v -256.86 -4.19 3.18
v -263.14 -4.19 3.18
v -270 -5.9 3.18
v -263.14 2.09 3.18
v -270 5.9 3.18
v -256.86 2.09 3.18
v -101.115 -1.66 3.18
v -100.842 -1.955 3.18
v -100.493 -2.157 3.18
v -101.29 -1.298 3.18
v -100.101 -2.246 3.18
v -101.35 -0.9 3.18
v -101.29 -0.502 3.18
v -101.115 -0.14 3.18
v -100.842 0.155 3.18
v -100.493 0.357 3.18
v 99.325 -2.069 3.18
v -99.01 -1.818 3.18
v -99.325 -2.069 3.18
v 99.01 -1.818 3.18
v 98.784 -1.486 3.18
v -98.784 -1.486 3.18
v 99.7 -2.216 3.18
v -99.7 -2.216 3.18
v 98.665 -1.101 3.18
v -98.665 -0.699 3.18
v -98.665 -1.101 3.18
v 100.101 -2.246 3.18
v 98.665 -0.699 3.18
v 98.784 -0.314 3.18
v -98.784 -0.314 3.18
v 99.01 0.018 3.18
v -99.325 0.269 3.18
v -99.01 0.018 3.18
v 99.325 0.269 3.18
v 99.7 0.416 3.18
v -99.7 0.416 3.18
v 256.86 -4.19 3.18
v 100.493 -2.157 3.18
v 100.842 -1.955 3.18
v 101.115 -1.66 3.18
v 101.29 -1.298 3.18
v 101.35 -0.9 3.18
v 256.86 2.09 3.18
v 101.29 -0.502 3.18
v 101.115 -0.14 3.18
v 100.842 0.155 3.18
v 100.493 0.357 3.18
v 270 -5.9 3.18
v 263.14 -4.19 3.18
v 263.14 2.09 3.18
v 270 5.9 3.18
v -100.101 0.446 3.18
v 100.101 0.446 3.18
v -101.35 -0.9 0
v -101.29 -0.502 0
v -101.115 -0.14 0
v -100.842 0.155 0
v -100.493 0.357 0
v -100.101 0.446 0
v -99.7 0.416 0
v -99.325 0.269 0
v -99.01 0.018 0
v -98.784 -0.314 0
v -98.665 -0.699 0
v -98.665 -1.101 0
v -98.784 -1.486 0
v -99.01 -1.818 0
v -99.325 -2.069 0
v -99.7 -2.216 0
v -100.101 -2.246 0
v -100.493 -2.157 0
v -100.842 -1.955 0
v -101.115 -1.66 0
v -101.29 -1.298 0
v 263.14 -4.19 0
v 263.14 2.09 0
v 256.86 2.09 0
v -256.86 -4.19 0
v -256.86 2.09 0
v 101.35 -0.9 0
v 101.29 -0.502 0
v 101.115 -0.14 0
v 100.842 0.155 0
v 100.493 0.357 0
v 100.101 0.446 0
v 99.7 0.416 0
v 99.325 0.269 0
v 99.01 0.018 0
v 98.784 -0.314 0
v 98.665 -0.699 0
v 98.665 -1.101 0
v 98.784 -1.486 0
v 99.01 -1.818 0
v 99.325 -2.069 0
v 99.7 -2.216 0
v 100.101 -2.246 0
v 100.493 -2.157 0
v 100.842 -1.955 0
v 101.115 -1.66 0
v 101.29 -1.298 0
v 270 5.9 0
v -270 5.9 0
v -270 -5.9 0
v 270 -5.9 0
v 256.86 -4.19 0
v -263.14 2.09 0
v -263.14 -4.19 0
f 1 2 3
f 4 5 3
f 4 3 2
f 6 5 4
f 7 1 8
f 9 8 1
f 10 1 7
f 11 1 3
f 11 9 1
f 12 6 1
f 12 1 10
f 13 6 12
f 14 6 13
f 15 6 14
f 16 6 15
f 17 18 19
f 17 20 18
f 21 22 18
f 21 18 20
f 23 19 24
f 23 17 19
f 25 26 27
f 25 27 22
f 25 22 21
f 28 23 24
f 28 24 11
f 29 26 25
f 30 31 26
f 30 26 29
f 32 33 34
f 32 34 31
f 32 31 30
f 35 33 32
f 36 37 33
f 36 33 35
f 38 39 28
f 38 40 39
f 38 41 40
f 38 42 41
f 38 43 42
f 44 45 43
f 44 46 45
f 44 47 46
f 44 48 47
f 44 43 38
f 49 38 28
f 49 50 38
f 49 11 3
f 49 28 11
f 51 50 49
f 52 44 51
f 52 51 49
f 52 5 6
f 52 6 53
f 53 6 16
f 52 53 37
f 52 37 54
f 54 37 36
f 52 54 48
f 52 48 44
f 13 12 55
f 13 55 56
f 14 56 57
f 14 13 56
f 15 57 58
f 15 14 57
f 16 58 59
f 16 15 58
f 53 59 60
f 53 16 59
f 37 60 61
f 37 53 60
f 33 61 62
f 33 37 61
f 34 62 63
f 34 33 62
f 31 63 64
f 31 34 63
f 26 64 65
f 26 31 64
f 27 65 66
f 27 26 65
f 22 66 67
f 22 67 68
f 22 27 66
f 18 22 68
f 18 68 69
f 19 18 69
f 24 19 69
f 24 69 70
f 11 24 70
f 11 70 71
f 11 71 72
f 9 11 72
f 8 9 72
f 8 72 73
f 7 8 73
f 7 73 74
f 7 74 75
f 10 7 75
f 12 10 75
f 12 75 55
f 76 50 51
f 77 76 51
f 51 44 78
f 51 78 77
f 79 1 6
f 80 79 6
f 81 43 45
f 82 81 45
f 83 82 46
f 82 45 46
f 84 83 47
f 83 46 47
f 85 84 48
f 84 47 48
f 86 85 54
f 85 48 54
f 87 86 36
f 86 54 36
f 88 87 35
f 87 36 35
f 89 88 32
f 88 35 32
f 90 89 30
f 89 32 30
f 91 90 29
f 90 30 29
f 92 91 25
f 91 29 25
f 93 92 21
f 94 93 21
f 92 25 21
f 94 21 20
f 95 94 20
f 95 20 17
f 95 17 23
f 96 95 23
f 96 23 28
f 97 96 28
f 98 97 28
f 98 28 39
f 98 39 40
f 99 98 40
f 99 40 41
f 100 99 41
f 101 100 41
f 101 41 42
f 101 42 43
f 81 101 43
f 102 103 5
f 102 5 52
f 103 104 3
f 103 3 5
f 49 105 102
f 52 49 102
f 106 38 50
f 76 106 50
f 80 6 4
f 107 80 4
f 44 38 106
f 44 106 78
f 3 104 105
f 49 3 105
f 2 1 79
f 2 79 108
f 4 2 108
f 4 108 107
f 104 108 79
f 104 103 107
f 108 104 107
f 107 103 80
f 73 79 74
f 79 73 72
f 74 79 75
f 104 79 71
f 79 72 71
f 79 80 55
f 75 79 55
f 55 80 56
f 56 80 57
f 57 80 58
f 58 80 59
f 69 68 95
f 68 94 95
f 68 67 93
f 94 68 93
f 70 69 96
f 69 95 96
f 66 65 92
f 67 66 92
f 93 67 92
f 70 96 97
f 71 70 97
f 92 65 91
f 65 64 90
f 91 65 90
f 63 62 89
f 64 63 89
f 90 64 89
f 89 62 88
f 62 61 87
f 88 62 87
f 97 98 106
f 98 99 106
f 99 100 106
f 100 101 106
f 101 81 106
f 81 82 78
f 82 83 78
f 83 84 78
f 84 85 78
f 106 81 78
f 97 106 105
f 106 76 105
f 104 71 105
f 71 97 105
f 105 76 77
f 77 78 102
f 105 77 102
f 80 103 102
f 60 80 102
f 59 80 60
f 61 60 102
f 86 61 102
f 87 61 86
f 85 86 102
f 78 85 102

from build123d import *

# Parameters (mm, degrees)
SKETCH1_W           = 540
SKETCH1_H           = 11.8
BOSS_EXTRUDE1_DEPTH = 3.18
CUT_EXTRUDE1_REACH  = 272.083
SKETCH2_W           = 6.28
SKETCH2_H           = 6.28
CUT_EXTRUDE2_REACH  = 272.083
SKETCH3_R           = 1.35


with BuildPart() as part:
    # Sketch1 → Boss-Extrude1 (new body)
    with BuildSketch(Plane.XY):
        Rectangle(SKETCH1_W, SKETCH1_H)
    extrude(amount=BOSS_EXTRUDE1_DEPTH)

    # Sketch2 → Cut-Extrude1 (cut, up to next)
    with BuildSketch(Plane.XY.offset(3.18), mode=Mode.PRIVATE) as cut_extrude1_sk1:
        with Locations((260, -1.05)):
            Rectangle(SKETCH2_W, SKETCH2_H)
    cut_extrude1_tool1 = extrude(cut_extrude1_sk1.sketch, amount=-CUT_EXTRUDE1_REACH, mode=Mode.PRIVATE) & part.part
    cut_extrude1 = cut_extrude1_tool1.solids().sort_by_distance((260, -1.05, 3.18))[0]
    add(cut_extrude1, mode=Mode.SUBTRACT)

    # Mirror1: Cut-Extrude1 across plane
    add(cut_extrude1.mirror(Plane(origin=(0, 0, 0), x_dir=(0, 0, 1), z_dir=(1, 0, 0))), mode=Mode.SUBTRACT)

    # Sketch3 → Cut-Extrude2 (cut, up to next)
    with BuildSketch(Plane.XY.offset(3.18), mode=Mode.PRIVATE) as cut_extrude2_sk1:
        with Locations((100, -0.9)):
            Circle(SKETCH3_R)
    cut_extrude2_tool1 = extrude(cut_extrude2_sk1.sketch, amount=-CUT_EXTRUDE2_REACH, mode=Mode.PRIVATE) & part.part
    cut_extrude2 = cut_extrude2_tool1.solids().sort_by_distance((100, -0.9, 3.18))[0]
    add(cut_extrude2, mode=Mode.SUBTRACT)

    # Mirror2: Cut-Extrude2 across plane
    add(cut_extrude2.mirror(Plane(origin=(0, 0, 0), x_dir=(0, 0, 1), z_dir=(1, 0, 0))), mode=Mode.SUBTRACT)


solid = part.part
